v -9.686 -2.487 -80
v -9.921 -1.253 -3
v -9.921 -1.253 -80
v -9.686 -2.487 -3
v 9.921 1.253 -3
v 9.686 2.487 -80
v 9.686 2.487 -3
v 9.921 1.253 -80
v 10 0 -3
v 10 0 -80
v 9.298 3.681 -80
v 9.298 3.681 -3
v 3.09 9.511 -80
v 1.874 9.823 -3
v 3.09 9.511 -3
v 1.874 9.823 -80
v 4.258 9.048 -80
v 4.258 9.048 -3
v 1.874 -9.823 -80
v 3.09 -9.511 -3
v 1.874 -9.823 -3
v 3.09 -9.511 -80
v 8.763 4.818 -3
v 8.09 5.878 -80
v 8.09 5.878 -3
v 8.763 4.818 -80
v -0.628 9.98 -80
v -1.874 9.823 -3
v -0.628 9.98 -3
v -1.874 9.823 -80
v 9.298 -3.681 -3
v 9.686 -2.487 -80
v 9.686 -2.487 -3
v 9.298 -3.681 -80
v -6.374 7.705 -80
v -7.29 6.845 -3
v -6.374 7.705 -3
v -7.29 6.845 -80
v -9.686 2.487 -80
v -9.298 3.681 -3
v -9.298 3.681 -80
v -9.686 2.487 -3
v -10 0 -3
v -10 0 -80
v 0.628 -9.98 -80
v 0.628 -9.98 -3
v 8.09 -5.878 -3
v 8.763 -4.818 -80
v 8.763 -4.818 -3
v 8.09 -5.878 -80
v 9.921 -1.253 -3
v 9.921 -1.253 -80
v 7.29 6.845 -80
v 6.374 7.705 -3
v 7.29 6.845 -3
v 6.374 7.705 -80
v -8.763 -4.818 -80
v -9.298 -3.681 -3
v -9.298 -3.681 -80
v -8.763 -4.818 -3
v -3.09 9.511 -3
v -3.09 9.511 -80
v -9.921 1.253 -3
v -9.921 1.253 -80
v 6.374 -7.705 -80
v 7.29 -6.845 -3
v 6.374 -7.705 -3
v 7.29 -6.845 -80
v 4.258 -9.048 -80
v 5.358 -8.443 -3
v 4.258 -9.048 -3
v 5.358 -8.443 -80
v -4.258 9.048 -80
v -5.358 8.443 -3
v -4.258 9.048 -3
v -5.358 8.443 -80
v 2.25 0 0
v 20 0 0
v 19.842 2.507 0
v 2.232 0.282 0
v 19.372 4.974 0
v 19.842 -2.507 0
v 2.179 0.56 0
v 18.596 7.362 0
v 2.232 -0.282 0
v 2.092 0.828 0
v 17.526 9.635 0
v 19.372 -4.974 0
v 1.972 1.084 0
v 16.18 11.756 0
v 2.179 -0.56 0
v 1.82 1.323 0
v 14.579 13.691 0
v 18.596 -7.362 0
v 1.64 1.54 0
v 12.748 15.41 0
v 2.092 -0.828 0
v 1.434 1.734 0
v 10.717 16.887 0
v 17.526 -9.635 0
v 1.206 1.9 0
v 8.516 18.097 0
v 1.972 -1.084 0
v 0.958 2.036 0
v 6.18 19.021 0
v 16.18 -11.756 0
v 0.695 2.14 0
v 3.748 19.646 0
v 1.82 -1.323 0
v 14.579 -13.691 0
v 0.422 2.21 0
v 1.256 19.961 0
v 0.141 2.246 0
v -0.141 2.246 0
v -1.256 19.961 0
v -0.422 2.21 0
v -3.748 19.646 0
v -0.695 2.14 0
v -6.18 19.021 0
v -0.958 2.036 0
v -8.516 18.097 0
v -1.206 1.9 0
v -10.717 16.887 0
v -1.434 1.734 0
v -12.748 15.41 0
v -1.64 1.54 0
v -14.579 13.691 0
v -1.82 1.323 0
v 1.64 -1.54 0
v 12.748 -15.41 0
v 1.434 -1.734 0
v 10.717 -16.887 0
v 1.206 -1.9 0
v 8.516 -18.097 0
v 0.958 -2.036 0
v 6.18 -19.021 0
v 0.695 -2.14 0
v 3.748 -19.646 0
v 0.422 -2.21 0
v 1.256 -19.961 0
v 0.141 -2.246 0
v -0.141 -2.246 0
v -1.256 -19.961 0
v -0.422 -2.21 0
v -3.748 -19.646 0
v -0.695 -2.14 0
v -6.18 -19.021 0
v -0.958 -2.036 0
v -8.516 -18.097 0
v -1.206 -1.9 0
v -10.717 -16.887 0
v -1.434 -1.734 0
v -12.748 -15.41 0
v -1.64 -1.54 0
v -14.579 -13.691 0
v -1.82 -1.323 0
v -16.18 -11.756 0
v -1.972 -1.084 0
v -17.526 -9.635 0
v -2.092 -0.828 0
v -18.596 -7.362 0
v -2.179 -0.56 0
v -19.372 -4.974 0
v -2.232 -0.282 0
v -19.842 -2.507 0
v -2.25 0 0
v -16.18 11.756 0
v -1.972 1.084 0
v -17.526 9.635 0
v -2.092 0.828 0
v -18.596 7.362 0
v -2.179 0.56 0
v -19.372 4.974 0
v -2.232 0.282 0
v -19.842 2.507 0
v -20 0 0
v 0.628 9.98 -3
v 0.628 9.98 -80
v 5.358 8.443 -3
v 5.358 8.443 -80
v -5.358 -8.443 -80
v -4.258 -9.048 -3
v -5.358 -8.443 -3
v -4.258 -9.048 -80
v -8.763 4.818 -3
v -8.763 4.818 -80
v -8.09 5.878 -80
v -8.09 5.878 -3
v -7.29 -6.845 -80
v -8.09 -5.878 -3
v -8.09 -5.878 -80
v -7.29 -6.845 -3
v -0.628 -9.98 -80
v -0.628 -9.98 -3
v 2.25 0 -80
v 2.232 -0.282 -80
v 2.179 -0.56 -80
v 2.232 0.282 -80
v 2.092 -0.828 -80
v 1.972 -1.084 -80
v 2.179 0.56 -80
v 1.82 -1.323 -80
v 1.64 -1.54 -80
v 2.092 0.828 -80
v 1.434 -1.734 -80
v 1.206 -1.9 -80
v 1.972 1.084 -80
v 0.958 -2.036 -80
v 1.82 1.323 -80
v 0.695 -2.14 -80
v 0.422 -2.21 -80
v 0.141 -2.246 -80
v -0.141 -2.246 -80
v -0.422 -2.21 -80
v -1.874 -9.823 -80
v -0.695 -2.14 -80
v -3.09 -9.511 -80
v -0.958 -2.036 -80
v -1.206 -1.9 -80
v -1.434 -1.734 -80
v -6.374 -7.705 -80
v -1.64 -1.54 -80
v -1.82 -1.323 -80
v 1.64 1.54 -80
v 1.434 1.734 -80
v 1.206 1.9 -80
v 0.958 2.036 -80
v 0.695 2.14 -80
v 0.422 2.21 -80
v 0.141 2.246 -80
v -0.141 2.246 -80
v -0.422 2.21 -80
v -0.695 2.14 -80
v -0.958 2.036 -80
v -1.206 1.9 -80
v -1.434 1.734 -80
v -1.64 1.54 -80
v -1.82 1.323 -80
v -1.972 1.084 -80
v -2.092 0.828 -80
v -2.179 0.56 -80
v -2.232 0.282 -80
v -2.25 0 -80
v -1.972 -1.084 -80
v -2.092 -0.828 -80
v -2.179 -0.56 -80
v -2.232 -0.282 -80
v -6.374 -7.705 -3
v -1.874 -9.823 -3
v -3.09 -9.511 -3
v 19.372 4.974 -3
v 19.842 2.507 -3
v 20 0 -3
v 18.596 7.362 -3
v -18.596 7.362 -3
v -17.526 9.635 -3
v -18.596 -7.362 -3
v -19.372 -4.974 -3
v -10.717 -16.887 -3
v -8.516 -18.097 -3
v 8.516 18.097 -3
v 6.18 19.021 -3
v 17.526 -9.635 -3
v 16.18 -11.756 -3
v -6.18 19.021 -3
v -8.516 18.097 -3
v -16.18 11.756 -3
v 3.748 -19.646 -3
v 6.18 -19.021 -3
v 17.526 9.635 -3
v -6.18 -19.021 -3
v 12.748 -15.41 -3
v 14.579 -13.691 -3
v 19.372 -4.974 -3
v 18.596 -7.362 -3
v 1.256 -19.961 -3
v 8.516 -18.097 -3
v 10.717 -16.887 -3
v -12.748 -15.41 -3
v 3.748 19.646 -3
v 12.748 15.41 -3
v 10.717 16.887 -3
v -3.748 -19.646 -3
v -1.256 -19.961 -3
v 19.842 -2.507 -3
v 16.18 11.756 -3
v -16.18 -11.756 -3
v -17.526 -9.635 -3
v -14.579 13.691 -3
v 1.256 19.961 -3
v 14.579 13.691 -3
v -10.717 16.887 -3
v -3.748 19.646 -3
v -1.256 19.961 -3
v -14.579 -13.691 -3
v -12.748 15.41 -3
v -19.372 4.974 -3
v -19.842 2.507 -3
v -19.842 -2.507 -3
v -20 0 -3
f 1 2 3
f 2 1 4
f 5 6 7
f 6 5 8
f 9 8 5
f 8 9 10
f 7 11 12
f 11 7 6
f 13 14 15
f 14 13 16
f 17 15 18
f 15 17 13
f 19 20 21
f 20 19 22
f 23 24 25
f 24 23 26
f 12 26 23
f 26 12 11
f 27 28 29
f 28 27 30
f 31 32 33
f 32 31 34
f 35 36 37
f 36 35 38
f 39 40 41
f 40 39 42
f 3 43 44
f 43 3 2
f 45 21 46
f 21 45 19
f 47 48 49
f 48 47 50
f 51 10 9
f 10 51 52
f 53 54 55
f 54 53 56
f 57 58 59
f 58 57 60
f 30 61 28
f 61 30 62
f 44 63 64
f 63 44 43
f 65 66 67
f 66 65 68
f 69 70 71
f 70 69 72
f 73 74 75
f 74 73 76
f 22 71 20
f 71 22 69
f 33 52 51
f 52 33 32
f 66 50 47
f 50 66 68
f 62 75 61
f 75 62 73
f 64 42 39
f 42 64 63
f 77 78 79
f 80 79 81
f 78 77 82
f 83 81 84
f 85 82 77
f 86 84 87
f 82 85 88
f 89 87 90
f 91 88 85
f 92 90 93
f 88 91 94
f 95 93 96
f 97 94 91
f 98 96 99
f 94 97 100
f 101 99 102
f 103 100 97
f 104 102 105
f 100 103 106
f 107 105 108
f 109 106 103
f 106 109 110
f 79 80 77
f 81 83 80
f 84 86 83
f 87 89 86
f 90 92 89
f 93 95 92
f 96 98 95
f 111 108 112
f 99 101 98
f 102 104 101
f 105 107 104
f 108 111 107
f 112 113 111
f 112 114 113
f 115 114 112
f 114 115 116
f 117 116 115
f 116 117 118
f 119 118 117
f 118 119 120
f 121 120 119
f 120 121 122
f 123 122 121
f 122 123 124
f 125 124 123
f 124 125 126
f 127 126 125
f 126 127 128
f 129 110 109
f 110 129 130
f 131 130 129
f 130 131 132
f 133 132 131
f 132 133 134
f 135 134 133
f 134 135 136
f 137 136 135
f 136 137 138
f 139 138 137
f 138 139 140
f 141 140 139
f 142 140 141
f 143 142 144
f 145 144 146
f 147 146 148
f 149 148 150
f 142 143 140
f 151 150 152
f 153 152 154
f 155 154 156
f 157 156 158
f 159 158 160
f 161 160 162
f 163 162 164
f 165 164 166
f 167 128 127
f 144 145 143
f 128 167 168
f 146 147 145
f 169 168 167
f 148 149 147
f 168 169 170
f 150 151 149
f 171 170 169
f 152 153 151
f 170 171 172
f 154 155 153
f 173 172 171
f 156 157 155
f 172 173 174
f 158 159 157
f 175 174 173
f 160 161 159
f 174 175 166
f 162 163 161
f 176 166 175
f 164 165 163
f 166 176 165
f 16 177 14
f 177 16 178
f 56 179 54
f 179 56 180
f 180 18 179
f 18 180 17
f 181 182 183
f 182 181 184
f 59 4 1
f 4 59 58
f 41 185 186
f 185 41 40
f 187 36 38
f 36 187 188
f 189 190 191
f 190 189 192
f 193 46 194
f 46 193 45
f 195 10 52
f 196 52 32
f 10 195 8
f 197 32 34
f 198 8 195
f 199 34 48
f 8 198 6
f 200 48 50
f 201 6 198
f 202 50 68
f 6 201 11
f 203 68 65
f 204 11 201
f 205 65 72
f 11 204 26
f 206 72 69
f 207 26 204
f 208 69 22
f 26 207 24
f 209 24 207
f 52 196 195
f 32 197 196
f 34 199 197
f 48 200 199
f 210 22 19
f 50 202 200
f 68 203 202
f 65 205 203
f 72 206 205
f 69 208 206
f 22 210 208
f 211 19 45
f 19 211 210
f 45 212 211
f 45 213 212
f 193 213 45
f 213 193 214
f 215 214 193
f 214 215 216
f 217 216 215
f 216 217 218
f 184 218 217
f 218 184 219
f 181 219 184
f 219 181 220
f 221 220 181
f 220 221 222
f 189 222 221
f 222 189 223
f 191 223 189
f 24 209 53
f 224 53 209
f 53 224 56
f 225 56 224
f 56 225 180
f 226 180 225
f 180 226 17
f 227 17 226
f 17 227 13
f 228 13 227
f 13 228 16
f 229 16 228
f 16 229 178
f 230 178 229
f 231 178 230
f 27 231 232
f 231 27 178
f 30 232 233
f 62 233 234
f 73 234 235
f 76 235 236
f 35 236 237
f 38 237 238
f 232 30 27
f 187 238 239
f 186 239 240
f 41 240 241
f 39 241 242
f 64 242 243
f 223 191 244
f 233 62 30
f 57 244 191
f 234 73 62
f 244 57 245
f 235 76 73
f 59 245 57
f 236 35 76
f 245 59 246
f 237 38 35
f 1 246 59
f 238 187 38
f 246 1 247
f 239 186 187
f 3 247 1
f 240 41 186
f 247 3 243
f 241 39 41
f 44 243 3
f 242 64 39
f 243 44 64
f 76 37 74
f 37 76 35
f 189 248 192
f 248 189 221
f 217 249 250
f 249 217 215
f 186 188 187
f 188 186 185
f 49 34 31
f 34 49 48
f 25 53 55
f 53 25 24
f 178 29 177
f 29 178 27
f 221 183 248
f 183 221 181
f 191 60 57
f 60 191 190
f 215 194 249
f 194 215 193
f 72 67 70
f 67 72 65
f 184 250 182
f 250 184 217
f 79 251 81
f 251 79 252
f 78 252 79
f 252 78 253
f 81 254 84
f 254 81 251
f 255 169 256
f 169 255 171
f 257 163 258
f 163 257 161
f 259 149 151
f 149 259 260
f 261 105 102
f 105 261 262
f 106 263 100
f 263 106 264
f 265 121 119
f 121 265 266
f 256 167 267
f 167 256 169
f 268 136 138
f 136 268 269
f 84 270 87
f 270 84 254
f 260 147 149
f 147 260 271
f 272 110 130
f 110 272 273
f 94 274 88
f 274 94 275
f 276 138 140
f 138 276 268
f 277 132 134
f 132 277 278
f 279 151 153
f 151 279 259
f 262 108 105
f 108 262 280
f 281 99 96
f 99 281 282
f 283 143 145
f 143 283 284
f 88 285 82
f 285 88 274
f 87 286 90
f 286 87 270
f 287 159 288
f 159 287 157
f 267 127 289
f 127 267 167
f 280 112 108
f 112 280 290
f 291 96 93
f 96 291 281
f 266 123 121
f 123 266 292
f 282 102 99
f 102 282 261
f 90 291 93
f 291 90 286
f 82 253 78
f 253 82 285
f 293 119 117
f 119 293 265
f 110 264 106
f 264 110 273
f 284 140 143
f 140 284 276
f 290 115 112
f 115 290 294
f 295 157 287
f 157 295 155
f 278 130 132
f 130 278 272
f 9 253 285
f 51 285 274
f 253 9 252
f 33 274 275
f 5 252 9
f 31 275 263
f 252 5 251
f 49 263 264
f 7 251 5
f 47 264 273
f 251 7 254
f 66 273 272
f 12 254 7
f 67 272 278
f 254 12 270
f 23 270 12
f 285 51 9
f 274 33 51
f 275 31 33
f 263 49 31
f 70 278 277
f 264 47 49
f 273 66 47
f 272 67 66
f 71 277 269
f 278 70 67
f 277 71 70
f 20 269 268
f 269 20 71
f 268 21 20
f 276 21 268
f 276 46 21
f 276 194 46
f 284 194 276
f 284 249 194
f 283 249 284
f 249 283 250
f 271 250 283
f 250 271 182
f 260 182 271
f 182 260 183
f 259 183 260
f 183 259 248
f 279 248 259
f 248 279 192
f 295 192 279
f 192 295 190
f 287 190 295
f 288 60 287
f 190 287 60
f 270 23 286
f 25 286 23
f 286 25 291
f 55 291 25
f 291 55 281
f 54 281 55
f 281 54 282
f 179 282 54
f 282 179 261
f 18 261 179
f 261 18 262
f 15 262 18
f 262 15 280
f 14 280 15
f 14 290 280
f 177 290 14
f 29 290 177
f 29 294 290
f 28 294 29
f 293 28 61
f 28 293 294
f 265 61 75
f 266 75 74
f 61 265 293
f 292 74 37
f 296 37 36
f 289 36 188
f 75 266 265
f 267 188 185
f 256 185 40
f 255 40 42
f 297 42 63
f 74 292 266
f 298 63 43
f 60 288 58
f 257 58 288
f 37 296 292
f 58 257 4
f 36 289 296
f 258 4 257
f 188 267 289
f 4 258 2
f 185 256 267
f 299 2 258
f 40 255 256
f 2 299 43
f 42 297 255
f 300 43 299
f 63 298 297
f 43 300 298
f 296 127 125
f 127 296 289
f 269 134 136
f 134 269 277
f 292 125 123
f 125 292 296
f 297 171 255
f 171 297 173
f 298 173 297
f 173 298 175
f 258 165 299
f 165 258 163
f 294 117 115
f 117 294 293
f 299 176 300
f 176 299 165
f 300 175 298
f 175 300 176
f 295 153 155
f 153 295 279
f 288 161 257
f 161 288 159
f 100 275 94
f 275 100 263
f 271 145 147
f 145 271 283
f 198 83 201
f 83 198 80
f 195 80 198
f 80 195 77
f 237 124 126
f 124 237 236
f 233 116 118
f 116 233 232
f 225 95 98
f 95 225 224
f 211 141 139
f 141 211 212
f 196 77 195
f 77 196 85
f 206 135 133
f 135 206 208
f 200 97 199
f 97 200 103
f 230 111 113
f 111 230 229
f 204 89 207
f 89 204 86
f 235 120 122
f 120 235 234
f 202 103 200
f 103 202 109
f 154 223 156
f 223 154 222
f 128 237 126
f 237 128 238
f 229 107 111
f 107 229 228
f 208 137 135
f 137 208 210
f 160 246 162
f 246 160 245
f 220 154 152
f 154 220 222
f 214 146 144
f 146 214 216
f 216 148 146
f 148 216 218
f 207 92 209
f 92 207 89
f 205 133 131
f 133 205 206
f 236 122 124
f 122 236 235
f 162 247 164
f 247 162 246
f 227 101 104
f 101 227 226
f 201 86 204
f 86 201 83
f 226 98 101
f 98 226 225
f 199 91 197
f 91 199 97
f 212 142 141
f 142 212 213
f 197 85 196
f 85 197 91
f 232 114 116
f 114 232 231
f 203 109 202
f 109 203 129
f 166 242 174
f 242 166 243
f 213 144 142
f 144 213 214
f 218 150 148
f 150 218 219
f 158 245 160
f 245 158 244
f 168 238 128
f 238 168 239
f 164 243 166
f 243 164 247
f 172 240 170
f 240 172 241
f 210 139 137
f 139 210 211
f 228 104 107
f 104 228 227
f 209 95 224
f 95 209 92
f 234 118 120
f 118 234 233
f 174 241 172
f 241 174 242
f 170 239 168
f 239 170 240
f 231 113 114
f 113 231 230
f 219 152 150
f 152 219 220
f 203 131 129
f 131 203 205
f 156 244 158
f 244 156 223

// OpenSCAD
$fn = 50;


difference() {
	union() {
		translate(v = [0, 0, -80.0000000000]) {
			cylinder(h = 80, r = 10.0000000000);
		}
		translate(v = [0, 0, -3.0000000000]) {
			cylinder(h = 3, r = 20.0000000000);
		}
	}
	union() {
		#translate(v = [0, 0, -80]) {
			cylinder(h = 80, r = 2.2500000000);
		}
	}
}
